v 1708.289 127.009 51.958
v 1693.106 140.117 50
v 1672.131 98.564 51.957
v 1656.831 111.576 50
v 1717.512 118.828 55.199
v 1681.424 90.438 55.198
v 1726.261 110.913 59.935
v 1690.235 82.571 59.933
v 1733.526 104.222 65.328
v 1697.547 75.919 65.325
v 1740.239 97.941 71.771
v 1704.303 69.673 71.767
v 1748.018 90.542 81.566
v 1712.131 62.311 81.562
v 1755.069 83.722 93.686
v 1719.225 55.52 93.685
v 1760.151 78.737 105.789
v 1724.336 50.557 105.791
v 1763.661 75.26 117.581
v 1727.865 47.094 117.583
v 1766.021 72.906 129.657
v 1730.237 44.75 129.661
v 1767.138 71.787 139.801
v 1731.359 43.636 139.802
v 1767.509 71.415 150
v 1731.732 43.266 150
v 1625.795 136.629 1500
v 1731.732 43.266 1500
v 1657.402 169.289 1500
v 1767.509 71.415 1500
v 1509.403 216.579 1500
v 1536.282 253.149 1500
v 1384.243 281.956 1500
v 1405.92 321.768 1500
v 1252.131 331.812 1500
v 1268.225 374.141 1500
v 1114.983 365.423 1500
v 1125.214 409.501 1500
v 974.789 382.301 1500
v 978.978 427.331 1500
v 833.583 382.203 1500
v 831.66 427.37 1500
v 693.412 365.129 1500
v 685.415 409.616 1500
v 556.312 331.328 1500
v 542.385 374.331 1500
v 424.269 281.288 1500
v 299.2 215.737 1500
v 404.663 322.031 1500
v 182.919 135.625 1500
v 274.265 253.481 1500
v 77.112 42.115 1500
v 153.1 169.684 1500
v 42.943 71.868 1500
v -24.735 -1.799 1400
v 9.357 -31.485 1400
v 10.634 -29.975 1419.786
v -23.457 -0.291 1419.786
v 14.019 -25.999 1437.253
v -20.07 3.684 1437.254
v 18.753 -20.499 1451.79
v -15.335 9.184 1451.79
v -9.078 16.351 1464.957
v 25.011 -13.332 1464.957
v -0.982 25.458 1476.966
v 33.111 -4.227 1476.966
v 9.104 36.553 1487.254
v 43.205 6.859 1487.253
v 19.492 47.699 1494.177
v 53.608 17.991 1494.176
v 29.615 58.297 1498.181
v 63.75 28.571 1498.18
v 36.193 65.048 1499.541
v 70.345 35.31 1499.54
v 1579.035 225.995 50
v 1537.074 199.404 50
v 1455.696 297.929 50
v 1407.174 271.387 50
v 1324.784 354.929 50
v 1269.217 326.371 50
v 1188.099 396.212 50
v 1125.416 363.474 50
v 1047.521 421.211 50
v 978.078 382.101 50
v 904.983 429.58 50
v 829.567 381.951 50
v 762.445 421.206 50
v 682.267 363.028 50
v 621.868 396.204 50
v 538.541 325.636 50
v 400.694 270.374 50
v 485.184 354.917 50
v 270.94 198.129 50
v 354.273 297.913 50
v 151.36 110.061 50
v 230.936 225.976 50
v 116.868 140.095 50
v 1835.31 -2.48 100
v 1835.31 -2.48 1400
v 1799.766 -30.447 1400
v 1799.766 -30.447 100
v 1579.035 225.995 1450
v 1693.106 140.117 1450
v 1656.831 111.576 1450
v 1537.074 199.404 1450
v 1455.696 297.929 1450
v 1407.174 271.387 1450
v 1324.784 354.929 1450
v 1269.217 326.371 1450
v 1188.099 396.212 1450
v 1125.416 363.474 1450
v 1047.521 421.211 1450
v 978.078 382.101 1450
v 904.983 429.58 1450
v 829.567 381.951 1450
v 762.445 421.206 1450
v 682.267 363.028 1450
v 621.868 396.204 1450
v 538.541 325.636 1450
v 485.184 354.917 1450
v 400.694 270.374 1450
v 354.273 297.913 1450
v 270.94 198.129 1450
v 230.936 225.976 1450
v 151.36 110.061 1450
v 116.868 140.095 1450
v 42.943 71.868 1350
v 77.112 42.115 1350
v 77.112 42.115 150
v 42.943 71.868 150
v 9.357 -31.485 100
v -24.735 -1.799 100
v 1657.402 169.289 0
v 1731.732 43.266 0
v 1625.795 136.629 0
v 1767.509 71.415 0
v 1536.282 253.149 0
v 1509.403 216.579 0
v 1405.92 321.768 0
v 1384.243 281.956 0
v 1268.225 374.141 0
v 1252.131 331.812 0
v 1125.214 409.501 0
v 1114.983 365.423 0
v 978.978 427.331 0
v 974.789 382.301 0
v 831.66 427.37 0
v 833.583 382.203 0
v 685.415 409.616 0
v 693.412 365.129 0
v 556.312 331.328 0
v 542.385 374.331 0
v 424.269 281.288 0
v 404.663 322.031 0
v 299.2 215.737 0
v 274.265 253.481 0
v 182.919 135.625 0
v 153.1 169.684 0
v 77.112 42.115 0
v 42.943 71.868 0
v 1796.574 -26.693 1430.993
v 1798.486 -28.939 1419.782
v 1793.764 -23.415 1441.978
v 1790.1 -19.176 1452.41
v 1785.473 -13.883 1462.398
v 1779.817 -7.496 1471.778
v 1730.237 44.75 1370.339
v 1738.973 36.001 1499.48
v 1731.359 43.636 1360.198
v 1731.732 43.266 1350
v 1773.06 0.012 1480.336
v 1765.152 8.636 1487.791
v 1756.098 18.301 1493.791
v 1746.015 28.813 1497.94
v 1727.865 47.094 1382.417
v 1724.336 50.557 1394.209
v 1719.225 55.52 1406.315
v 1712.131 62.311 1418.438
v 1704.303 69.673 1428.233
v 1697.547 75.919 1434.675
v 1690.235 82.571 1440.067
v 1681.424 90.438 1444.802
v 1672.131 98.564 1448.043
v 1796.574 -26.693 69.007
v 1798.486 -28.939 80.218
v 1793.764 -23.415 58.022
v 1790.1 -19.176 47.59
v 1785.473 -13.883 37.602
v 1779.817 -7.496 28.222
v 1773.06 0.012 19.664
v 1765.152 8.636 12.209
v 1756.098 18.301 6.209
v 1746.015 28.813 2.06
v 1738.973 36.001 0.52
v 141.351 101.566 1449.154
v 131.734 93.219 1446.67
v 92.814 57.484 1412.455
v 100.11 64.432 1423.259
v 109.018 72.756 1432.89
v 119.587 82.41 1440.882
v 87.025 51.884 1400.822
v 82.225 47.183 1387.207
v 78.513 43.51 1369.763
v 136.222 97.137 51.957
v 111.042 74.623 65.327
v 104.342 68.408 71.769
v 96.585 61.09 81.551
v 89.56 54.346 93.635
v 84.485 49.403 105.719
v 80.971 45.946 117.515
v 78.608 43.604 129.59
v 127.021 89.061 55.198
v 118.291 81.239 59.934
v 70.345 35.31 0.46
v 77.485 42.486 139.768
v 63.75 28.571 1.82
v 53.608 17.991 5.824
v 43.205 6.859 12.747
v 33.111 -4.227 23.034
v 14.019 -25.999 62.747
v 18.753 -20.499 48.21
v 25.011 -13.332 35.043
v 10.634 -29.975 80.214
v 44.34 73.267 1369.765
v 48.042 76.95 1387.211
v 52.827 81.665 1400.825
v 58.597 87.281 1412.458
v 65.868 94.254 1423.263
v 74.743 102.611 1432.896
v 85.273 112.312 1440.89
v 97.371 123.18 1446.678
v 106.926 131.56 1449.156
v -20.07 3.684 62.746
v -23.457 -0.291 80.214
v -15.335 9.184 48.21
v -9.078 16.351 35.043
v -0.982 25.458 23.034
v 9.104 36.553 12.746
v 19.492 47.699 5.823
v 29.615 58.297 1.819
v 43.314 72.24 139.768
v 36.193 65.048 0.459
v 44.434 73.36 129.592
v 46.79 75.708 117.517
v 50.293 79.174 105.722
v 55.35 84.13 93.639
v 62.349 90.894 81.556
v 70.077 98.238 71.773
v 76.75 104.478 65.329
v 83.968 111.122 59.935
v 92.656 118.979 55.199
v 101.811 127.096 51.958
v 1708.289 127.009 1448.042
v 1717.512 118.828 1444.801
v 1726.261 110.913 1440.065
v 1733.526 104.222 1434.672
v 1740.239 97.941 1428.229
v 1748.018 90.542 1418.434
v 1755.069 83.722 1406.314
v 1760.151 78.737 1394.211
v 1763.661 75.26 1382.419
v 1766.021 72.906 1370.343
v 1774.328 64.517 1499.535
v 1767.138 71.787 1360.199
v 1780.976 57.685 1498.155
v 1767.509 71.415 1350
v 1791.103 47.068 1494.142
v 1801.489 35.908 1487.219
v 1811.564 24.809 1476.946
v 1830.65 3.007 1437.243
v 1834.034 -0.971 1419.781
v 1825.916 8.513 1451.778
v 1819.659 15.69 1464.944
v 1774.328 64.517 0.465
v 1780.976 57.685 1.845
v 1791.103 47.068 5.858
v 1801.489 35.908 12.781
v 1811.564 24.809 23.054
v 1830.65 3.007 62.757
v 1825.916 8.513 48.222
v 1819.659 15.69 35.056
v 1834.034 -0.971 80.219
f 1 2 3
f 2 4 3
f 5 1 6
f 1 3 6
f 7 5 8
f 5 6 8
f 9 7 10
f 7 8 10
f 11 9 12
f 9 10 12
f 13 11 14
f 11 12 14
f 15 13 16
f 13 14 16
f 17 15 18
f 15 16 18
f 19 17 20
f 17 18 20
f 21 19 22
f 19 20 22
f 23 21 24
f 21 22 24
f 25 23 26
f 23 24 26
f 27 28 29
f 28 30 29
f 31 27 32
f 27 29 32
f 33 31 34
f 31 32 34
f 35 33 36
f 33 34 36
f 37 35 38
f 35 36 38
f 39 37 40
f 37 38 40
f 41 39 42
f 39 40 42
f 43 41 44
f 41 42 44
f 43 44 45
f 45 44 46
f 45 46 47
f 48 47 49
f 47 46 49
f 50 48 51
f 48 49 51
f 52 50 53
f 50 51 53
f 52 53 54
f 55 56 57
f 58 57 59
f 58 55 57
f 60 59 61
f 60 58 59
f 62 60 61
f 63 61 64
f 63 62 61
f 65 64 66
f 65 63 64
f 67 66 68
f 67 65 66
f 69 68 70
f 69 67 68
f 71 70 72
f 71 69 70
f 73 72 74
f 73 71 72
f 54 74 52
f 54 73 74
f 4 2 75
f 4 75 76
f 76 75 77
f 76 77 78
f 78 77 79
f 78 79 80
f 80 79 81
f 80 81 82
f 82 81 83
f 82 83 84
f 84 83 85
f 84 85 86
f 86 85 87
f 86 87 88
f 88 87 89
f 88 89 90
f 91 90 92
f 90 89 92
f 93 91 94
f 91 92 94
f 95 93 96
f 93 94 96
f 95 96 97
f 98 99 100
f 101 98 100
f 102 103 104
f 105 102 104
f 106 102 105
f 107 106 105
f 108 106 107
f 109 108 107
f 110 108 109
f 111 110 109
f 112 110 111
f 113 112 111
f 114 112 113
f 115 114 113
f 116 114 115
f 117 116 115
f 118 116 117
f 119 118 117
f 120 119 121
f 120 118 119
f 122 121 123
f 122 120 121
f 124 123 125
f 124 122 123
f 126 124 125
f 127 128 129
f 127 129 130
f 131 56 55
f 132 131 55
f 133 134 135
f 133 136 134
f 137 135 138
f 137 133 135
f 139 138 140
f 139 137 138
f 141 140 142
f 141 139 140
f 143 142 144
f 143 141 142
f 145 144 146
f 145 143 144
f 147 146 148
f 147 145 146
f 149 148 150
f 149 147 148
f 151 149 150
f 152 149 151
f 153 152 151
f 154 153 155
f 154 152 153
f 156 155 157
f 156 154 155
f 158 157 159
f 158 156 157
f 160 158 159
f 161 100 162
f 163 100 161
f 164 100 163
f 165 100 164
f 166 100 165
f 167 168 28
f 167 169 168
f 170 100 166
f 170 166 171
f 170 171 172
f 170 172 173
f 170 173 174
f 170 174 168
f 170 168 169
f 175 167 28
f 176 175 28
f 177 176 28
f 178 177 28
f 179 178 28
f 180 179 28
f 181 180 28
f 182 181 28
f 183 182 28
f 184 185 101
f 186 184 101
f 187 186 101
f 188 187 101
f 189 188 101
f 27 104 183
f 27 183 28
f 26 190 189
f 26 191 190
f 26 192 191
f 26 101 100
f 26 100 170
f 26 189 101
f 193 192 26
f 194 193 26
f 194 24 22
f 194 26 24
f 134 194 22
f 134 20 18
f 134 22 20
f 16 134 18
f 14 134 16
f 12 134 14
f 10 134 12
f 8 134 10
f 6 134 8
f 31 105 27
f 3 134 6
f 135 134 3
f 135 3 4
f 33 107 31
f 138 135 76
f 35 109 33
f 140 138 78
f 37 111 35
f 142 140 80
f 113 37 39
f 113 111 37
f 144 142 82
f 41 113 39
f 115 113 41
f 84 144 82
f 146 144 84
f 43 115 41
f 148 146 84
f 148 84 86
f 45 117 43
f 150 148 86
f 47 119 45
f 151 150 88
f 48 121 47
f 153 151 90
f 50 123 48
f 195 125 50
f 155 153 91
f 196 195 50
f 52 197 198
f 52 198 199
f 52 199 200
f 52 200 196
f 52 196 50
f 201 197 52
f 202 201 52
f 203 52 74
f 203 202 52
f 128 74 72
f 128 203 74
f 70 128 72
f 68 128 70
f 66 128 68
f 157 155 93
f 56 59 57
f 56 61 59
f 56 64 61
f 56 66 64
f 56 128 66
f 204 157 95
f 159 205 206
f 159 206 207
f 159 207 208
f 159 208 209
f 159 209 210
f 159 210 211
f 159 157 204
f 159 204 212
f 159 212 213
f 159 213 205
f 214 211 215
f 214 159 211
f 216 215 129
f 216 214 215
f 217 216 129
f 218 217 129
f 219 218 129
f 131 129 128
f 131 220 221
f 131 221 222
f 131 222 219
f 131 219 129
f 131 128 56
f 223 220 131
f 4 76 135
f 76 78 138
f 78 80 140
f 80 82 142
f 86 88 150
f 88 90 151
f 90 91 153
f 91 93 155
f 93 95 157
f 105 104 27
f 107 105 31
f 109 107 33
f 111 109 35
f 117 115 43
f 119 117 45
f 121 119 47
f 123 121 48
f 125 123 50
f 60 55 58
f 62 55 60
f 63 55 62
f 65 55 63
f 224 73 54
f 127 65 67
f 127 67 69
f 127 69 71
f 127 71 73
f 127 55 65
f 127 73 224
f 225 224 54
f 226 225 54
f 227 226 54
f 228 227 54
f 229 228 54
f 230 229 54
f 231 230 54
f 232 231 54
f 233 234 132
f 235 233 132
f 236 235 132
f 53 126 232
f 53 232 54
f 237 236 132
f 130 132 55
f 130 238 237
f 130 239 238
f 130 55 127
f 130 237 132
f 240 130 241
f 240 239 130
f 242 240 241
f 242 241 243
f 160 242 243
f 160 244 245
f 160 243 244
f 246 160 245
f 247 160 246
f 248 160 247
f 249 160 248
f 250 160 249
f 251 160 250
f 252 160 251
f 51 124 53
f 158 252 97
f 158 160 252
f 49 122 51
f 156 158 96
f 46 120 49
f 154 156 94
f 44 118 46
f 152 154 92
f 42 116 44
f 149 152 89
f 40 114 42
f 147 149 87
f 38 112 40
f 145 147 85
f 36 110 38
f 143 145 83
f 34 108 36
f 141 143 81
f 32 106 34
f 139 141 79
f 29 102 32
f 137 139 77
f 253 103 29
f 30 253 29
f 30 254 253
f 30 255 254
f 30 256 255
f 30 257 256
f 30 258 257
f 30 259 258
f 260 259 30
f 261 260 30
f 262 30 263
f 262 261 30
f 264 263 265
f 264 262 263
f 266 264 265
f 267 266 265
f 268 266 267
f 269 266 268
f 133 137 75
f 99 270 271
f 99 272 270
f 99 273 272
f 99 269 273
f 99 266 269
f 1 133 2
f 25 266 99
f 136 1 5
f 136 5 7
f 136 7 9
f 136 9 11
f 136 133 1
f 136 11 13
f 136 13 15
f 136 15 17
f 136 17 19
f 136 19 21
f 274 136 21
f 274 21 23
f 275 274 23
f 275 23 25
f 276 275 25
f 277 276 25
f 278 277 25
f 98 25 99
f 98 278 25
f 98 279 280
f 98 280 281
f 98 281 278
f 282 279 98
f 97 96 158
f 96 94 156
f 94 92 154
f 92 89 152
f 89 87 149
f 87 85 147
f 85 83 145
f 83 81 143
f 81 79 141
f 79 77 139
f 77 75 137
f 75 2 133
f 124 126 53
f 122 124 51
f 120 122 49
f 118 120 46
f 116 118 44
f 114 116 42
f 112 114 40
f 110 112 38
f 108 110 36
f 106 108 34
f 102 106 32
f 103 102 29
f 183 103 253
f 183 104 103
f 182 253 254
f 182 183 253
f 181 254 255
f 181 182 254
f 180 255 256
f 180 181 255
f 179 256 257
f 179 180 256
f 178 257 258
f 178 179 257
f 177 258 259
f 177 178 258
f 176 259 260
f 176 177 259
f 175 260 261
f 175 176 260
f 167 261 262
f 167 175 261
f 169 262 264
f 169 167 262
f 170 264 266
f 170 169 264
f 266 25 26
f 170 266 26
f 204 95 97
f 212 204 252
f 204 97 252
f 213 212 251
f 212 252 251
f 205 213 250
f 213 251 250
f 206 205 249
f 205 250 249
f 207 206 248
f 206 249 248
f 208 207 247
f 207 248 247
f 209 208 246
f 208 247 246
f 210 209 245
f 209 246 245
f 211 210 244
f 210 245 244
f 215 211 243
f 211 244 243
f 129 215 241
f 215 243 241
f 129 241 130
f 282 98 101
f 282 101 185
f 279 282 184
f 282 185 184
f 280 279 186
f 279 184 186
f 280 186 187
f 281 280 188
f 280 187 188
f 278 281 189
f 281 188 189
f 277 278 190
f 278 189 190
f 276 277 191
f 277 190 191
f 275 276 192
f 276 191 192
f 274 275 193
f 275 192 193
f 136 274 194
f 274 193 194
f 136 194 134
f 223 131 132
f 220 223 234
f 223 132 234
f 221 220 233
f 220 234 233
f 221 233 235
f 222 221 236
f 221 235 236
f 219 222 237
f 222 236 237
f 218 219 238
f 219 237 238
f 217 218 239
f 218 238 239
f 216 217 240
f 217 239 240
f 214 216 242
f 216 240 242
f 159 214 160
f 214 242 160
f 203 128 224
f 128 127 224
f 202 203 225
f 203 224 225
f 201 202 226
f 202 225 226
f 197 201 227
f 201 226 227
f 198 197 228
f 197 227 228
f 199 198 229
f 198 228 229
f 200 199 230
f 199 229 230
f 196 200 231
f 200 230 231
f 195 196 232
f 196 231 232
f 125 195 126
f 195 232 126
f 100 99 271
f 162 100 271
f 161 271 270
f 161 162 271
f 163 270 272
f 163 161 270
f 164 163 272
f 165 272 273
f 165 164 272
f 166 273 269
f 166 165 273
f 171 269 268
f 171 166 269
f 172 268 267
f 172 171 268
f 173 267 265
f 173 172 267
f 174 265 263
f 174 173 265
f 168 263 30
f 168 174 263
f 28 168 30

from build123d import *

# Parameters (mm, degrees)
BOSS_EXTRUDE4_DEPTH = 1500
FILLET2_R           = 100
CUT_EXTRUDE1_DEPTH  = 1400
FILLET3_R           = 100


with BuildPart() as part:
    # Sketch1 → Boss-Extrude4 (new body)
    with BuildSketch(Plane.XY):
        with BuildLine():
            Line((1835.310496497, -2.480275435), (1799.765613012, -30.447060895))
            ThreePointArc((1799.765613012, -30.447060895), (904.320634181, 384.38013336), (9.35701304, -31.484541797))
            Line((9.35701304, -31.484541797), (-24.735019353, -1.799246648))
            ThreePointArc((-24.735019353, -1.799246648), (905.445806615, 429.580248582), (1835.310496497, -2.480275435))
        make_face()
    extrude(amount=BOSS_EXTRUDE4_DEPTH)

    # Fillet2
    fillet2_edges = [part.edges().sort_by_distance(p)[0] for p in [
        (1817.538054755, -16.463668165, 1500),
        (-7.689003156, -16.641894223, 1500),
        (1817.538054755, -16.463668165, 0),
        (-7.689003156, -16.641894223, 0),
    ]]
    fillet(fillet2_edges, radius=FILLET2_R)

    # Sketch2 → Cut-Extrude1 (cut)
    with BuildSketch(Plane.XY.offset(50)):
        with BuildLine():
            Line((1767.508699471, 71.415320952), (1731.731952363, 43.266104728))
            ThreePointArc((1731.731952363, 43.266104728), (904.184365492, 384.380046478), (77.112203072, 42.114991378))
            Line((77.112203072, 42.114991378), (42.942511203, 71.867907736))
            ThreePointArc((42.942511203, 71.867907736), (905.319541026, 429.580288265), (1767.508699471, 71.415320952))
        make_face()
    extrude(amount=CUT_EXTRUDE1_DEPTH, mode=Mode.SUBTRACT)

    # Fillet3
    fillet3_edges = [part.edges().sort_by_distance(p)[0] for p in [
        (60.027357138, 56.991449557, 50),
        (1749.620325917, 57.34071284, 50),
        (60.027357138, 56.991449557, 1450),
        (1749.620325917, 57.34071284, 1450),
    ]]
    fillet(fillet3_edges, radius=FILLET3_R)


solid = part.part
